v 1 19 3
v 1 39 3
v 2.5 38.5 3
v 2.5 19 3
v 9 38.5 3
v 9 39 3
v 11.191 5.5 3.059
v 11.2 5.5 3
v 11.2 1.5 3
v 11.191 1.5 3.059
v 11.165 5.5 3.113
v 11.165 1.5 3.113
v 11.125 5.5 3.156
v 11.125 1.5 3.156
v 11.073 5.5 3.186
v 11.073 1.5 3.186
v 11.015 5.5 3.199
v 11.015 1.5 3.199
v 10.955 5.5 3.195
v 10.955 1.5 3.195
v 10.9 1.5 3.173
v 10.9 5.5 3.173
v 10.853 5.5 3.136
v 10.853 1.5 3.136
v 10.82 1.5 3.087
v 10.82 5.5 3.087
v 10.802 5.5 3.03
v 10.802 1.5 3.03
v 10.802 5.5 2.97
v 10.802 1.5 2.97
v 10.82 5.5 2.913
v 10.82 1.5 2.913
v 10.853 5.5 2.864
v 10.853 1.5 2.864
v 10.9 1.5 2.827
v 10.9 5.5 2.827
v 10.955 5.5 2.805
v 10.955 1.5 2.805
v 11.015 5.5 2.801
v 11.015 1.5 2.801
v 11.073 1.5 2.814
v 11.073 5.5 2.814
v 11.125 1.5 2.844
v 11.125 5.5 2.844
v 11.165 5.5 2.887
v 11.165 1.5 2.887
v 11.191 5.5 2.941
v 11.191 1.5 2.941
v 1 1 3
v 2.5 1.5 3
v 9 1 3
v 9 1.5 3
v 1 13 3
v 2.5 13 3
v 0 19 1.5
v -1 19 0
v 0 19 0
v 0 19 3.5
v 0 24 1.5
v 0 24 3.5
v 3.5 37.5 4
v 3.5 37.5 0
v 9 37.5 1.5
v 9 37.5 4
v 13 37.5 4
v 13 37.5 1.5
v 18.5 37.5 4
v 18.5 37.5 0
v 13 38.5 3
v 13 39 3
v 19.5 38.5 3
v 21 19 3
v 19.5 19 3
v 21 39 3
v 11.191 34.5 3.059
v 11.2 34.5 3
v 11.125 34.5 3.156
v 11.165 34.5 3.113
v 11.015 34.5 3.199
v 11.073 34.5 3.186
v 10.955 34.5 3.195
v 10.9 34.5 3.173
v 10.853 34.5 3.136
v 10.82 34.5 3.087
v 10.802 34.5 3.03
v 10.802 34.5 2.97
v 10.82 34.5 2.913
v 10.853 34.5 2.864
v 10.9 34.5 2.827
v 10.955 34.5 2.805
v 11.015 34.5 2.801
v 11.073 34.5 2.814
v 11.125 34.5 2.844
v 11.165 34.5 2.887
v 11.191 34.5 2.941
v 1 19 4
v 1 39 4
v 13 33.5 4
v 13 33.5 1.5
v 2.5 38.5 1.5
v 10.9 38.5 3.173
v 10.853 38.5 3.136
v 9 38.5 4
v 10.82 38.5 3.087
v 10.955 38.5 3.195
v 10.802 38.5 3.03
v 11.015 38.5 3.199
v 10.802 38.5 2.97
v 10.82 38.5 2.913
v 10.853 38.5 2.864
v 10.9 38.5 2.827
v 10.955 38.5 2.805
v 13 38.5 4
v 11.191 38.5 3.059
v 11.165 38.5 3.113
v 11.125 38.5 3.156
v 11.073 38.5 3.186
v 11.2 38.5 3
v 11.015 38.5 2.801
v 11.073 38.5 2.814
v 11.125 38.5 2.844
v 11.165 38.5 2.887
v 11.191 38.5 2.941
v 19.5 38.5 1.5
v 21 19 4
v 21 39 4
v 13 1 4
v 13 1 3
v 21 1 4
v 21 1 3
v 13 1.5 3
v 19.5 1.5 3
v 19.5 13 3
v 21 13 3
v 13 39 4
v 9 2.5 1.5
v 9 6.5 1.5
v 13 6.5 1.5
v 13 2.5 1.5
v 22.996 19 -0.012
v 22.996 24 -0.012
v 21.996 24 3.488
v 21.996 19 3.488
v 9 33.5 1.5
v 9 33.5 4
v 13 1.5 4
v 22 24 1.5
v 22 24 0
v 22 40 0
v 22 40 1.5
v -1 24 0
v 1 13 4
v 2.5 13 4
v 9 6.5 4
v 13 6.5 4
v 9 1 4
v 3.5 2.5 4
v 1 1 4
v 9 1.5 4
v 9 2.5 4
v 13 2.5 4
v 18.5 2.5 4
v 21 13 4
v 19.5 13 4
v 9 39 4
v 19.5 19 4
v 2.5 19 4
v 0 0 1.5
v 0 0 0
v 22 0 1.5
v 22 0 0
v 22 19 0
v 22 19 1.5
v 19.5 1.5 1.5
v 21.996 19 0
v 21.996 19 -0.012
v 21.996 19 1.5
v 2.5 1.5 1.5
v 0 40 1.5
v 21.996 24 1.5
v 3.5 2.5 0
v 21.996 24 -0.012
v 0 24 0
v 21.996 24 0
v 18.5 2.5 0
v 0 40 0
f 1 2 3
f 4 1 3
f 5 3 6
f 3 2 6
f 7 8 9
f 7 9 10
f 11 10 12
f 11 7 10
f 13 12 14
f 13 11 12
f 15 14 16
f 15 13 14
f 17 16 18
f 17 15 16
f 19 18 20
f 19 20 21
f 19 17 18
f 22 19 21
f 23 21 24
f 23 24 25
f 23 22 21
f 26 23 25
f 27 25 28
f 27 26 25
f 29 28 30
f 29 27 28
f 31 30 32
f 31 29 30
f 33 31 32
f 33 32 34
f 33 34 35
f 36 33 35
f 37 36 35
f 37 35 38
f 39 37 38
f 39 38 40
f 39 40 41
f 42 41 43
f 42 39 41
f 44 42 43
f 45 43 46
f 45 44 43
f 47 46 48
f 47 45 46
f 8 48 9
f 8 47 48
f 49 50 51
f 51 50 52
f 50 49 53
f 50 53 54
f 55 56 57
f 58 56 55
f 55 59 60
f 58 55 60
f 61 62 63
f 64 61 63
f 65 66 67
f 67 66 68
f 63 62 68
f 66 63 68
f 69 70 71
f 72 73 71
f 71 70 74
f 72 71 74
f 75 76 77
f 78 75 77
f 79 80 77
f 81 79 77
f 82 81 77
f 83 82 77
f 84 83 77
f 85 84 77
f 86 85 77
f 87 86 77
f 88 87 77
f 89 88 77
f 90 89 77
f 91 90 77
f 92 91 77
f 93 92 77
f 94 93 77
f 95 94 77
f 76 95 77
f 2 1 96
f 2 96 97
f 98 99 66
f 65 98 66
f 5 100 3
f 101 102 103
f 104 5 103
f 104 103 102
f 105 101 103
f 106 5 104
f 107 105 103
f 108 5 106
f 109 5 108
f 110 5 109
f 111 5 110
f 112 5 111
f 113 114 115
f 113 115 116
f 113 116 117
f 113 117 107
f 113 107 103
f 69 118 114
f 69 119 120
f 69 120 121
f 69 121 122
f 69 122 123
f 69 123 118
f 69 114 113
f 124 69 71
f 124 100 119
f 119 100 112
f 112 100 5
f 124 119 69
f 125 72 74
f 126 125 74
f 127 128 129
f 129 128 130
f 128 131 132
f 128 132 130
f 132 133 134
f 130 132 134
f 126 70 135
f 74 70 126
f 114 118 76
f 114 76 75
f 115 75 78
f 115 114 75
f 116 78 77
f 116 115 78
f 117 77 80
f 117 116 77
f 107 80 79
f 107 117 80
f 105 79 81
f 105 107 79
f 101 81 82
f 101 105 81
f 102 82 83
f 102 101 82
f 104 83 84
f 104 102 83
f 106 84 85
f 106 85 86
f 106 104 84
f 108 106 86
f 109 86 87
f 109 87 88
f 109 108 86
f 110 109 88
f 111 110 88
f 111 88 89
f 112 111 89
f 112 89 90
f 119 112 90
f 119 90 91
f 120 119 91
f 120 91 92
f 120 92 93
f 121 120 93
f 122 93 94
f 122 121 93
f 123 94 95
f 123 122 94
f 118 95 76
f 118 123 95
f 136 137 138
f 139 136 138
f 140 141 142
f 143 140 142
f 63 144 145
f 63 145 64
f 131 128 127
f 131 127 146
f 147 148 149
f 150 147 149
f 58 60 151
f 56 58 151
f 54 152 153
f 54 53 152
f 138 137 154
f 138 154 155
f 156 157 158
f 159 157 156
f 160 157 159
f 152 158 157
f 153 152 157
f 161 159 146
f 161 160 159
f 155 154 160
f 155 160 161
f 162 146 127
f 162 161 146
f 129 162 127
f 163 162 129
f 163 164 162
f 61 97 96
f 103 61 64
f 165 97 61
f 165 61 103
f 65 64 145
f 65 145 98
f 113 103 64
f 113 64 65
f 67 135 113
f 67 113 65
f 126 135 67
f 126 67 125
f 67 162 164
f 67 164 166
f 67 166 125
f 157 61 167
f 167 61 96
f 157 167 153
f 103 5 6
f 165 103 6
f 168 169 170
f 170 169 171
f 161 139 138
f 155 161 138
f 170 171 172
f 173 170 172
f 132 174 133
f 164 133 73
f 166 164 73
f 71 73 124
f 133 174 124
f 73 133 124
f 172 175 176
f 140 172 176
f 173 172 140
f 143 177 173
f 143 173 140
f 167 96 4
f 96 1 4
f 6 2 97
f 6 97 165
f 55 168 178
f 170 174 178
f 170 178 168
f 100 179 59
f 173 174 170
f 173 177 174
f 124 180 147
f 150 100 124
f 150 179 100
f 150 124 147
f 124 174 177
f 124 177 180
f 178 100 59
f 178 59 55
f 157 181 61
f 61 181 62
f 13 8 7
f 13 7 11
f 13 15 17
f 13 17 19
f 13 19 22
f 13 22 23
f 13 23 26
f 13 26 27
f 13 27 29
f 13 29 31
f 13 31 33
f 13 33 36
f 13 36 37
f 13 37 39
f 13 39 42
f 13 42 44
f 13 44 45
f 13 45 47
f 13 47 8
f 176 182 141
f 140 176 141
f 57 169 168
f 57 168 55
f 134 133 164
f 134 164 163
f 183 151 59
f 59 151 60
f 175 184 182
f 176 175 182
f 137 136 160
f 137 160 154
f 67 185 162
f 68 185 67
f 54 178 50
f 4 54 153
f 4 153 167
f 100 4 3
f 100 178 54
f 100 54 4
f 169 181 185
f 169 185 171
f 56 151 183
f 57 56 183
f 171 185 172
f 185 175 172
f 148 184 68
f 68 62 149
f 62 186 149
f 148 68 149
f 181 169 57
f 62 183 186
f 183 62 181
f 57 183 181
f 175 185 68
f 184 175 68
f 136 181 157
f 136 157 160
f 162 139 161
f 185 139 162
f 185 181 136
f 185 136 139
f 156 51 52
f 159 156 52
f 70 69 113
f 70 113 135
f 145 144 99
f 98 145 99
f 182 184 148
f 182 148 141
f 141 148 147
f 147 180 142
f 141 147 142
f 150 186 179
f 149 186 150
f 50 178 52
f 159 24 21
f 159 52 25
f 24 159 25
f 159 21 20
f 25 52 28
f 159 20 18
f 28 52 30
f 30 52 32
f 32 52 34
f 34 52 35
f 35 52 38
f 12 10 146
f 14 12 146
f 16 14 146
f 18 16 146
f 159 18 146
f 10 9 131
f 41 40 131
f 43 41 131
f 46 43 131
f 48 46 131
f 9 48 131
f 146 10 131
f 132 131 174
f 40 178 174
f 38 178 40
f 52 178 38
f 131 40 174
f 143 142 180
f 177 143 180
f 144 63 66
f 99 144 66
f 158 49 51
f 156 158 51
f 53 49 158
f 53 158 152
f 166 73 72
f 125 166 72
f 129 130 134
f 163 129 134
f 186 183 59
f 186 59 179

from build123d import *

# Parameters (mm, degrees)
CYLINDER_R             = 0.2
CYLINDER_DEPTH         = 4
CYLINDER_ROLL_ANGLE    = 90
CYLINDER001_R          = 0.2
CYLINDER001_DEPTH      = 4
CYLINDER001_ROLL_ANGLE = 90
BOX010_W               = 4
BOX010_H               = 2
BOX010_DEPTH           = 2.5
BOX011_W               = 4
BOX011_H               = 2
BOX011_DEPTH           = 2.5
BOX007_W               = 6
BOX007_H               = 6
BOX007_DEPTH           = 5
BOX006_W               = 6
BOX006_H               = 6
BOX006_DEPTH           = 5
BOX001_W               = 15
BOX001_H               = 35
BOX001_DEPTH           = 10
BOX004_W               = 17
BOX004_H               = 37
BOX004_DEPTH           = 2.5
BOX005_W               = 20
BOX005_H               = 38
BOX005_DEPTH           = 1
BOX_W                  = 22
BOX_H                  = 40
BOX_DEPTH              = 1.5
PAD_DEPTH              = 5
PAD001_DEPTH           = 5
BOX008_W               = 4
BOX008_H               = 5
BOX008_DEPTH           = 2.5
BOX009_W               = 4
BOX009_H               = 5
BOX009_DEPTH           = 2.5


with BuildPart() as m3_hole1:
    # Cylinder → Cylinder (new body)
    with BuildSketch(Plane.XY):
        Circle(CYLINDER_R)
    extrude(amount=CYLINDER_DEPTH)


with BuildPart() as m3_hole1_1:
    # Cylinder roll: moved
    add(m3_hole1.part.rotate(Axis((0, 0, 0), (1, 0, 0)), CYLINDER_ROLL_ANGLE))


with BuildPart() as m3_hole1_2:
    # Cylinder placement: moved
    add(m3_hole1_1.part.moved(Location((11, 5.5, 3))))


with BuildPart() as screw_holes:
    # Cylinder001 → Cylinder001 (new body)
    with BuildSketch(Plane.XY):
        Circle(CYLINDER001_R)
    extrude(amount=CYLINDER001_DEPTH)


with BuildPart() as screw_holes_1:
    # Cylinder001 roll: moved
    add(screw_holes.part.rotate(Axis((0, 0, 0), (1, 0, 0)), CYLINDER001_ROLL_ANGLE))


with BuildPart() as screw_holes_2:
    # Cylinder001 placement: moved
    add(screw_holes_1.part.moved(Location((11, 38.5, 3))))

    # Fusion003: union M3 hole1
    add(m3_hole1_2.part)


with BuildPart() as remove:
    # Box010 → Box010 (new body)
    with BuildSketch(Plane(origin=(9, -0.5, 1.5), x_dir=(1, 0, 0), z_dir=(0, 0, 1))):
        with Locations((2, 1)):
            Rectangle(BOX010_W, BOX010_H)
    extrude(amount=BOX010_DEPTH)


with BuildPart() as fusion004:
    # Box011 → Box011 (new body)
    with BuildSketch(Plane(origin=(9, 38.5, 1.5), x_dir=(1, 0, 0), z_dir=(0, 0, 1))):
        with Locations((2, 1)):
            Rectangle(BOX011_W, BOX011_H)
    extrude(amount=BOX011_DEPTH)

    # Fusion004: union remove
    add(remove.part)


with BuildPart() as space001:
    # Box007 → Box007 (new body)
    with BuildSketch(Plane(origin=(19.5, 13, 1.5), x_dir=(1, 0, 0), z_dir=(0, 0, 1))):
        with Locations((3, 3)):
            Rectangle(BOX007_W, BOX007_H)
    extrude(amount=BOX007_DEPTH)


with BuildPart() as fusion001:
    # Box006 → Box006 (new body)
    with BuildSketch(Plane(origin=(-3.5, 13, 1.5), x_dir=(1, 0, 0), z_dir=(0, 0, 1))):
        with Locations((3, 3)):
            Rectangle(BOX006_W, BOX006_H)
    extrude(amount=BOX006_DEPTH)

    # Fusion001: union space001
    add(space001.part)


with BuildPart() as inner_space:
    # Box001 → Box001 (new body)
    with BuildSketch(Plane(origin=(3.5, 2.5, 0), x_dir=(1, 0, 0), z_dir=(0, 0, 1))):
        with Locations((7.5, 17.5)):
            Rectangle(BOX001_W, BOX001_H)
    extrude(amount=BOX001_DEPTH)


with BuildPart() as track_inner:
    # Box004 → Box004 (new body)
    with BuildSketch(Plane(origin=(2.5, 1.5, 1.5), x_dir=(1, 0, 0), z_dir=(0, 0, 1))):
        with Locations((8.5, 18.5)):
            Rectangle(BOX004_W, BOX004_H)
    extrude(amount=BOX004_DEPTH)


with BuildPart() as track_outer:
    # Box005 → Box005 (new body)
    with BuildSketch(Plane(origin=(1, 1, 3), x_dir=(1, 0, 0), z_dir=(0, 0, 1))):
        with Locations((10, 19)):
            Rectangle(BOX005_W, BOX005_H)
    extrude(amount=BOX005_DEPTH)


with BuildPart() as cut002:
    # Box → Box (new body)
    with BuildSketch(Plane.XY):
        with Locations((11, 20)):
            Rectangle(BOX_W, BOX_H)
    extrude(amount=BOX_DEPTH)

    # Fusion: union track_inner, track_outer
    add(track_inner.part)
    add(track_outer.part)

    # Cut: cut inner space
    add(inner_space.part, mode=Mode.SUBTRACT)

    # Cut001: cut Fusion001
    add(fusion001.part, mode=Mode.SUBTRACT)

    # Cut002: cut Fusion004
    add(fusion004.part, mode=Mode.SUBTRACT)


with BuildPart() as pad:
    # Sketch → Pad (new body)
    with BuildSketch(Plane.XZ.offset(-21)):
        Polygon((0, 0), (0, 3.5), (-1, 0), align=None)
    extrude(amount=PAD_DEPTH)


with BuildPart() as slide_control:
    # Sketch001 → Pad001 (new body)
    with BuildSketch(Plane.XZ.offset(-21)):
        Polygon((21.996317, 3.488174), (21.996317, -0.011826), (22.996317, -0.011826), align=None)
    extrude(amount=PAD001_DEPTH)

    # Fusion005: union Pad
    add(pad.part)


with BuildPart() as slide_control_1:
    # Fusion005 placement: moved
    add(slide_control.part.moved(Location((0, 3, 0))))


with BuildPart() as screw_block1:
    # Box008 → Box008 (new body)
    with BuildSketch(Plane(origin=(9, 1.5, 1.5), x_dir=(1, 0, 0), z_dir=(0, 0, 1))):
        with Locations((2, 2.5)):
            Rectangle(BOX008_W, BOX008_H)
    extrude(amount=BOX008_DEPTH)


with BuildPart() as basesensormount:
    # Box009 → Box009 (new body)
    with BuildSketch(Plane(origin=(9, 33.5, 1.5), x_dir=(1, 0, 0), z_dir=(0, 0, 1))):
        with Locations((2, 2.5)):
            Rectangle(BOX009_W, BOX009_H)
    extrude(amount=BOX009_DEPTH)

    # Fusion002: union screw block1
    add(screw_block1.part)

    # Fusion006: union Cut002, slide control
    add(cut002.part)
    add(slide_control_1.part)

    # Cut003: cut screw holes
    add(screw_holes_2.part, mode=Mode.SUBTRACT)


solid = basesensormount.part
